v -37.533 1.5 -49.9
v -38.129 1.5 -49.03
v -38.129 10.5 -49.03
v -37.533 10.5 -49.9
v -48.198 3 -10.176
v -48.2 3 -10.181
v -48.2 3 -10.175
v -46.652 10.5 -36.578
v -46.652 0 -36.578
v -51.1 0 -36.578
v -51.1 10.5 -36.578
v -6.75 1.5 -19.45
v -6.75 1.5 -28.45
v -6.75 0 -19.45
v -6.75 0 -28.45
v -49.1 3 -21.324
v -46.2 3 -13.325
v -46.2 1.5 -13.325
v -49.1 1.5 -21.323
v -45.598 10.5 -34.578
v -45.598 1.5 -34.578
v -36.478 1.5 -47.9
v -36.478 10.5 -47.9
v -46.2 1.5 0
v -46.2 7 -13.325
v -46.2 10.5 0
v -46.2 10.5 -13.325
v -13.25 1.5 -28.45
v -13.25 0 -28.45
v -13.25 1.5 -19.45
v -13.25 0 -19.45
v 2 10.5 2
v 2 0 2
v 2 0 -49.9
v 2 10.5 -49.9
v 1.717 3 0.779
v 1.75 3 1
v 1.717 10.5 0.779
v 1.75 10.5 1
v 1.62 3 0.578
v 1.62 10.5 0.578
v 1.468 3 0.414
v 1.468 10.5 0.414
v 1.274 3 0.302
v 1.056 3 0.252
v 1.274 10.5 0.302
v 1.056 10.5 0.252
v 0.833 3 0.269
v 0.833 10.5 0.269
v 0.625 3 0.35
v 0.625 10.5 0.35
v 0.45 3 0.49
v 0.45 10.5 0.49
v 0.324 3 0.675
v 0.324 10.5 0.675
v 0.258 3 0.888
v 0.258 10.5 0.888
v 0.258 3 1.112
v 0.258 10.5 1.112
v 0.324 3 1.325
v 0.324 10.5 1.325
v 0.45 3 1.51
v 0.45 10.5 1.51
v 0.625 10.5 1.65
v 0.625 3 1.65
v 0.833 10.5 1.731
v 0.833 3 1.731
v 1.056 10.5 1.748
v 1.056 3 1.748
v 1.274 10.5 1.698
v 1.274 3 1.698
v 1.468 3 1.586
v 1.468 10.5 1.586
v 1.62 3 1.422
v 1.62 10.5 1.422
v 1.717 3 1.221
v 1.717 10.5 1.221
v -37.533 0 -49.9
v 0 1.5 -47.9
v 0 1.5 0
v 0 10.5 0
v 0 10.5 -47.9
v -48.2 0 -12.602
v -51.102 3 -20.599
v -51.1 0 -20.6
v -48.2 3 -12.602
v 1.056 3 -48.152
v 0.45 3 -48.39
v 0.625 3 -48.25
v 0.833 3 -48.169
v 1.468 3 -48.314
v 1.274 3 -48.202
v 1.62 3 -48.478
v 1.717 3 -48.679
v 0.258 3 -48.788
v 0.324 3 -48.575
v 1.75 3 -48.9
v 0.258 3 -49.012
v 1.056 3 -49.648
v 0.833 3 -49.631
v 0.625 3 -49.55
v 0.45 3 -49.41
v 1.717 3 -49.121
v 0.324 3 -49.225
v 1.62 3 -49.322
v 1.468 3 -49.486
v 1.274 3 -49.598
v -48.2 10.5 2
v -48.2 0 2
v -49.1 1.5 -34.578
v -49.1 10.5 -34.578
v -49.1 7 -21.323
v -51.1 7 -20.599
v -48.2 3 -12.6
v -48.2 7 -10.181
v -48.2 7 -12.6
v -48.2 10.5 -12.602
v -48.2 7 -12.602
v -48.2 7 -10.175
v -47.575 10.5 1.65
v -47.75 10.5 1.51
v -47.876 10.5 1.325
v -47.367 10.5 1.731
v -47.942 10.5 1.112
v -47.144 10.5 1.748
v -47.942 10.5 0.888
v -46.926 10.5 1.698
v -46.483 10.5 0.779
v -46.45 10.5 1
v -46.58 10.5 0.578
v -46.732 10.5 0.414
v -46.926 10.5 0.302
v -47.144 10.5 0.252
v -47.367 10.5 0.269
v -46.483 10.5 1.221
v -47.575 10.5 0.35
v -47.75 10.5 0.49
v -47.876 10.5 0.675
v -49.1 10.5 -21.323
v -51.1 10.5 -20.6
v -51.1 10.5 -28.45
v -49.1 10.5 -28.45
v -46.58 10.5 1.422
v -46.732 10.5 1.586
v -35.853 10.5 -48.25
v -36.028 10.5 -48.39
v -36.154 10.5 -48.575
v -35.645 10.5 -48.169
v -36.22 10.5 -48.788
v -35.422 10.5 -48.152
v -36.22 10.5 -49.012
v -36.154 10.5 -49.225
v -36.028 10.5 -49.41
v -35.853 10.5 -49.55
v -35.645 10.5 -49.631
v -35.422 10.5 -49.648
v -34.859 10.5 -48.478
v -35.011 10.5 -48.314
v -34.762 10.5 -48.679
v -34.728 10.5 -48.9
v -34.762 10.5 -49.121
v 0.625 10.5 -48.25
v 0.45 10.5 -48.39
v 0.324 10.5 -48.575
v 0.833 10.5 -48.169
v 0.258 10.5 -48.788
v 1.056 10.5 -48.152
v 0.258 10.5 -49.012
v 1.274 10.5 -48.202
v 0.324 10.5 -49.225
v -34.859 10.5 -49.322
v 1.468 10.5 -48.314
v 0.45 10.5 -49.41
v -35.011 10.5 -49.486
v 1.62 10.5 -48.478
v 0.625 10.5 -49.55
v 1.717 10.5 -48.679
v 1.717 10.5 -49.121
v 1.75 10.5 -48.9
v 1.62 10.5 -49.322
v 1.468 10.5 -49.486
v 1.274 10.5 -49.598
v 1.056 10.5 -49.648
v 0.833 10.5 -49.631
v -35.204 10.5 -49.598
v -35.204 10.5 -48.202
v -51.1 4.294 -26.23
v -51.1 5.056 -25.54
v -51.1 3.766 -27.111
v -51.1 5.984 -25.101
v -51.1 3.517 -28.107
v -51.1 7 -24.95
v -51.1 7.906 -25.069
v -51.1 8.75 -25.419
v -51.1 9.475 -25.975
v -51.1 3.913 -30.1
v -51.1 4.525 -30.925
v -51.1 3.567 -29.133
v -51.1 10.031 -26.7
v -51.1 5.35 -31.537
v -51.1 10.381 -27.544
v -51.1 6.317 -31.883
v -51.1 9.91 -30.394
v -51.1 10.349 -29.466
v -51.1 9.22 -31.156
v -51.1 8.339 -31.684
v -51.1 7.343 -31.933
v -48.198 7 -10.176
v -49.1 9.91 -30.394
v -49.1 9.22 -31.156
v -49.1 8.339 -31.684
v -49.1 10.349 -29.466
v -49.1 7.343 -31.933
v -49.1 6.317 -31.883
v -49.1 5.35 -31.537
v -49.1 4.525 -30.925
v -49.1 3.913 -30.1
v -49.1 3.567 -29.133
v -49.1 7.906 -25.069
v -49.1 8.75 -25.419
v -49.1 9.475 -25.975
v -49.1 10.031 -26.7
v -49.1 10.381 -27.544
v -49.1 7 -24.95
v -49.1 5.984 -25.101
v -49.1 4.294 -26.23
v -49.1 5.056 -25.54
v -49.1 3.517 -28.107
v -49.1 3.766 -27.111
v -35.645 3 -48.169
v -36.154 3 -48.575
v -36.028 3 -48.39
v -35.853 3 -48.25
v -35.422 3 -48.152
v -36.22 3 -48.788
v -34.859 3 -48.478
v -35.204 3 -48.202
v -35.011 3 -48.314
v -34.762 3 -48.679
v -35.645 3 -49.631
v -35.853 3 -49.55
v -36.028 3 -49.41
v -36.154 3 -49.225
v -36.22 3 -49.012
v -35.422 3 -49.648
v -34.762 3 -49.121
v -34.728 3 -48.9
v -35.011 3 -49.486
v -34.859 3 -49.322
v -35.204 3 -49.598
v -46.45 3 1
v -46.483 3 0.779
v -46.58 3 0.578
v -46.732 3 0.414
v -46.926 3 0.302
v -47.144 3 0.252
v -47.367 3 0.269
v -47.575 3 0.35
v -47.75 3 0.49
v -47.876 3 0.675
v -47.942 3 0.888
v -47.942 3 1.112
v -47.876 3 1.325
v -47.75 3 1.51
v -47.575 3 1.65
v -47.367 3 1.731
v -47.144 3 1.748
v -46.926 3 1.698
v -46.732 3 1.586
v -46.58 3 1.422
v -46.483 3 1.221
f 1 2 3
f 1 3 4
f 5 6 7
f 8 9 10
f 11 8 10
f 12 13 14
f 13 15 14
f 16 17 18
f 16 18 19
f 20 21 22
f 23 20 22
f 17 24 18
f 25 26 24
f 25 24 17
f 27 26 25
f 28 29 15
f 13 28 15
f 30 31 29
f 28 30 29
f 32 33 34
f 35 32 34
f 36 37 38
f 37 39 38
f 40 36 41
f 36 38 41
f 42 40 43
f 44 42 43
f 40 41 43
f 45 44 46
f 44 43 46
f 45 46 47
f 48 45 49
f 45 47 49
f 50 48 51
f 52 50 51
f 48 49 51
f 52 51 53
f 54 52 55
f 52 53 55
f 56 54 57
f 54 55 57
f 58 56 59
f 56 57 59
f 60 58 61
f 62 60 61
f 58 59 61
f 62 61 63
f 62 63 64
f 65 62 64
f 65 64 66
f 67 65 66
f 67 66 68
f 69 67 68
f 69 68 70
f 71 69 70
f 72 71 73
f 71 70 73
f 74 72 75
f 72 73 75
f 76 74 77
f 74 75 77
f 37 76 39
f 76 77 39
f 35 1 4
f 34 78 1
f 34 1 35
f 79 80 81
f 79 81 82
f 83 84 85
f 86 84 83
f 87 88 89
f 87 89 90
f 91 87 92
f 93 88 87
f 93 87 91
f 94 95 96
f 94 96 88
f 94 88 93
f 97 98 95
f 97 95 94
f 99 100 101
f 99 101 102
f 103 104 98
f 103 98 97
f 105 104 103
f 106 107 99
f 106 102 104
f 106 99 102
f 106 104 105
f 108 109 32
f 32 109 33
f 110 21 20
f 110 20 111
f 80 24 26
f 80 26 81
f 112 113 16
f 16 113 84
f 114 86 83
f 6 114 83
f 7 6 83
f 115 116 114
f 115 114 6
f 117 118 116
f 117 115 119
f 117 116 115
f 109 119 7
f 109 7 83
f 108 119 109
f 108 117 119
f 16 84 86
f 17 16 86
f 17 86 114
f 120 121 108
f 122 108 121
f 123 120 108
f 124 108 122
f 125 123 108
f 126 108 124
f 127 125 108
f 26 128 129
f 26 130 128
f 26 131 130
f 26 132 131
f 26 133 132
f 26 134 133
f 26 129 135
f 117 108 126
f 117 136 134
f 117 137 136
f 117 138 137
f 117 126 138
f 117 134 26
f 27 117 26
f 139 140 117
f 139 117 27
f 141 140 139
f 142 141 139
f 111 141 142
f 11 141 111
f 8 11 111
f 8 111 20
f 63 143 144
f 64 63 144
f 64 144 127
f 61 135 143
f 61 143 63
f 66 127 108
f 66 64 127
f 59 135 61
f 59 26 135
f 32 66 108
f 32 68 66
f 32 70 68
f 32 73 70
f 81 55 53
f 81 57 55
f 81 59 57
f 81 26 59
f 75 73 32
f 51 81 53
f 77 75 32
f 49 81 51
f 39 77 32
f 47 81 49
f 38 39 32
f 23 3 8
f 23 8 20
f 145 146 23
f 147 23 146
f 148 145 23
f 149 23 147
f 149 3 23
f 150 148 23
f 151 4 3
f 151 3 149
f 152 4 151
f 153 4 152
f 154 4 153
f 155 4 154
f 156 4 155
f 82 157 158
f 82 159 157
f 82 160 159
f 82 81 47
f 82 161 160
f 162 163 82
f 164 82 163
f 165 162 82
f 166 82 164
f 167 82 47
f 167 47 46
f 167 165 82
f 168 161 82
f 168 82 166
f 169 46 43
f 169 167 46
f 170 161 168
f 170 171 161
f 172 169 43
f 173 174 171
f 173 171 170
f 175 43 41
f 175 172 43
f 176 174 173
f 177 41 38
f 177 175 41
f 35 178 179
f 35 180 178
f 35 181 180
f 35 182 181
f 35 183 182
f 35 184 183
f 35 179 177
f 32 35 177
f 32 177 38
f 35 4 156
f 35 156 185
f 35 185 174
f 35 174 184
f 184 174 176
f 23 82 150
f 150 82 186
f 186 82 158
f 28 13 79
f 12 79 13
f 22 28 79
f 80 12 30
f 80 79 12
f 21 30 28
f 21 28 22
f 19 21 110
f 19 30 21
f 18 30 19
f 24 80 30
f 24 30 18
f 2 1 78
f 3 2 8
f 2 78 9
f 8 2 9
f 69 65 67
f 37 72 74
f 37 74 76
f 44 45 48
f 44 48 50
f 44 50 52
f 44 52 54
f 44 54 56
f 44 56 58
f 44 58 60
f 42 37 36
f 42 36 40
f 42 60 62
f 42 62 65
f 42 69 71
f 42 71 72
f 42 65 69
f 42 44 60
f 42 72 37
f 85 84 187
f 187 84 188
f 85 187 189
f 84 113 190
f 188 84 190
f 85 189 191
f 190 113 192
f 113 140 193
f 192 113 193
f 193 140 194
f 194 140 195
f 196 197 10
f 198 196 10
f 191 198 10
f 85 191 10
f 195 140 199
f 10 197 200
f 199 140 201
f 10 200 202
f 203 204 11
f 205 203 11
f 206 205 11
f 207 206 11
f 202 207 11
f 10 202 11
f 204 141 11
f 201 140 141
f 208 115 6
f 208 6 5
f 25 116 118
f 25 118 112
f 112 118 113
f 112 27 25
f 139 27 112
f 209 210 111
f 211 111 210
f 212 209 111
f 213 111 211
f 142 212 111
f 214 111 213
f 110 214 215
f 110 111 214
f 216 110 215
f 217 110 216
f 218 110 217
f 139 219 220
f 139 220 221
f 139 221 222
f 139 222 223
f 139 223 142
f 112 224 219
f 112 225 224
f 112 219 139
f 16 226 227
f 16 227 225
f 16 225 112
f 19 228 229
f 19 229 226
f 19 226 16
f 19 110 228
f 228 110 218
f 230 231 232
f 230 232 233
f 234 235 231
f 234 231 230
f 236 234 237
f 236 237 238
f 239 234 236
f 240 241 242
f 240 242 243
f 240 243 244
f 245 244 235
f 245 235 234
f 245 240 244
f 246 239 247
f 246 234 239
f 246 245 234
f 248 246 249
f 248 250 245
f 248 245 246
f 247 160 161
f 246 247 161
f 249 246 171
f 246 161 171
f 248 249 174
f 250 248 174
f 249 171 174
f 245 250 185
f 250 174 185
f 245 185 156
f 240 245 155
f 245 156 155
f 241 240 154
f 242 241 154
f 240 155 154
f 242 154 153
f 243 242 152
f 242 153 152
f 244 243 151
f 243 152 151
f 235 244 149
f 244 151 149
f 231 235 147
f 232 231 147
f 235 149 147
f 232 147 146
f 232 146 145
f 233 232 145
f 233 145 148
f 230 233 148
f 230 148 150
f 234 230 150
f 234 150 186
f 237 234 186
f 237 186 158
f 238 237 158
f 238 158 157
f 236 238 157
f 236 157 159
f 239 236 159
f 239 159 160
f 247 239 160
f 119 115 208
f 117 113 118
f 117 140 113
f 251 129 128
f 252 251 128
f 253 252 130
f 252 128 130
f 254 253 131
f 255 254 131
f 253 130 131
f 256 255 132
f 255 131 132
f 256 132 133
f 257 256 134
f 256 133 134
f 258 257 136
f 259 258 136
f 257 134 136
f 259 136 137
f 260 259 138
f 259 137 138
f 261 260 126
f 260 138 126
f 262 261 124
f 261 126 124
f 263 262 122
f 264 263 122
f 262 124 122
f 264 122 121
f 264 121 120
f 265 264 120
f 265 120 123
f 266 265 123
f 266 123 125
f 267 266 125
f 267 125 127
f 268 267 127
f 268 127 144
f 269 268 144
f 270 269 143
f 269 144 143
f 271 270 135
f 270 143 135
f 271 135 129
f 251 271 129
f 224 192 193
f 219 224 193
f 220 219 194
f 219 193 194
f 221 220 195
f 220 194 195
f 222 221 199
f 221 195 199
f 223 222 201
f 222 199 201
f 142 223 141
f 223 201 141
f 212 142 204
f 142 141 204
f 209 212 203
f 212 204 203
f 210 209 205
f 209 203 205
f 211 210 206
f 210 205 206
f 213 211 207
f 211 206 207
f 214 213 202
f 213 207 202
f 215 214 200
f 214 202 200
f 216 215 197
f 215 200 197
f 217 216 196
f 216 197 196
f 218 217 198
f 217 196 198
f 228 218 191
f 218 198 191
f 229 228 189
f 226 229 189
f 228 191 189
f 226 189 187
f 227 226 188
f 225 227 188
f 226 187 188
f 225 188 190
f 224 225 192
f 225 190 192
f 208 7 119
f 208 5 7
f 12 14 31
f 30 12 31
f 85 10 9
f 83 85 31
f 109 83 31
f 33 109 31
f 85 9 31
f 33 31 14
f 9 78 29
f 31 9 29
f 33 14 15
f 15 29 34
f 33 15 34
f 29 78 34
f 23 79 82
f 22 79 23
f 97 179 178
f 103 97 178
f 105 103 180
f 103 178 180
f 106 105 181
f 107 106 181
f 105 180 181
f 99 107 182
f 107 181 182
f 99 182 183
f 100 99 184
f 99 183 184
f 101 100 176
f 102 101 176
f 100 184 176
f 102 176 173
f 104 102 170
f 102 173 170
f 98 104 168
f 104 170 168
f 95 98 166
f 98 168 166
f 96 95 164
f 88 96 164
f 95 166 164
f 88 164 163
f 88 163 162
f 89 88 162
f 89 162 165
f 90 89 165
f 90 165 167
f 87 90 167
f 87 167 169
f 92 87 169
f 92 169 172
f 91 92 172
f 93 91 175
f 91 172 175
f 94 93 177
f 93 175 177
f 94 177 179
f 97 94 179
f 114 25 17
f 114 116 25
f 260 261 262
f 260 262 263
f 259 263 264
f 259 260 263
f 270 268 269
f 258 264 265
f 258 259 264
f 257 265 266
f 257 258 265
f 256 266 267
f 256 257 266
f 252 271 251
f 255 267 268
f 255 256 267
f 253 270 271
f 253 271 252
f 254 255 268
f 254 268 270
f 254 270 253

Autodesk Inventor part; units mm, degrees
ref_plane "YZ Plane" through (0, 0, 0) normal (1, 0, 0) x (0, 1, 0)
ref_plane "XZ Plane" through (0, 0, 0) normal (0, 1, 0) x (-1, 0, 0)
ref_plane "XY Plane" through (0, 0, 0) normal (0, 0, 1) x (1, 0, 0)
sketch "Sketch1" plane through (0, 0, 0) normal (0, 1, 0) x (-1, 0, 0)
  line L0 (0, 0) -> (49.1, 0)
  line L1 (49.1, -47.9) -> (0, -47.9)
  line L2 (0, -47.9) -> (0, 0)
  line L3 (46.7, -10.9) -> (49.1, -18.9)
  line L4 (46.7, -10.9) -> (46.7, 0)
  line L5 (49.1, 0) -> (46.7, 0)
  line L6 (49.1, -18.9) -> (49.1, -47.9)
  dimension "d0" = 49.1
  dimension "d1" = 47.9
  dimension "d2" = 18.9
extrude "Extrusion1" add sketch "Sketch1" along normal blind 1.5
sketch "Sketch2" plane through (0, 1.5, 0) normal (0, 1, 0) x (1, 0, 0)
  line L0 (-49.1, 18.9) -> (-46.7, 10.9) projected
  line L1 (-46.2, 10.9) -> (-46.2, 0)
  line L2 (-46.2, 0) -> (-46.7, 0)
  line L3 (-46.7, 10.9) -> (-46.7, 0) projected
  line L4 (-46.7, 0) -> (-46.7, 10.9)
  line L5 (-49.1, 47.9) -> (-49.1, 18.9) projected
  line L6 (-46.7, 10.9) -> (-49.1, 18.9)
  line L7 (-49.1, 18.9) -> (-46.2, 10.9)
  point P0 (0, 0)
extrude "Extrusion2" cut sketch "Sketch2" against normal blind 10
sketch "Sketch3" plane through (0, 1.5, 0) normal (0, 1, 0) x (1, 0, 0)
  line L0 (-49.1, 47.9) -> (-49.1, 18.9) projected
  line L1 (-49.1, 34.5784) -> (-45.5979, 34.5784)
  line L2 (-45.5979, 34.5784) -> (-36.4784, 47.9)
  line L3 (0, 47.9) -> (-49.1, 47.9) projected
  line L4 (-49.1, 47.9) -> (-36.4784, 47.9)
  line L5 (-49.1, 47.9) -> (-49.1, 34.5784)
  point P0 (0, 0)
extrude "Extrusion3" cut sketch "Sketch3" against normal blind 10
sketch "Sketch4" plane through (0, 1.5, 0) normal (0, 1, 0) x (1, 0, 0)
  line L0 (-46.2, 10.9) -> (-49.1, 18.9) projected
  line L1 (-46.2, 0) -> (0, 0) projected
  line L2 (-46.2, -2) -> (0, -2)
  line L3 (0, -2) -> (2, -2)
  line L4 (2, -2) -> (2, 47.9)
  line L5 (0, 47.9) -> (-36.4784, 47.9) projected
  line L6 (2, 47.9) -> (2, 49.9)
  line L7 (2, 49.9) -> (-36.4784, 49.9)
  line L8 (-38.1287, 49.0298) -> (-37.533, 49.9)
  line L9 (-37.533, 49.9) -> (-36.4784, 49.9)
  line L10 (-45.5979, 34.5784) -> (-36.4784, 47.9) projected
  line L11 (-49.1, 36.5784) -> (-46.6525, 36.5784)
  line L12 (-46.6525, 36.5784) -> (-37.533, 49.9)
  line L13 (-46.2, -2) -> (-48.2, -2)
  line L14 (-48.2, -2) -> (-48.2, 10.9)
  line L15 (-51.1, 18.9) -> (-48.2, 10.9)
  line L16 (-49.1, 36.5784) -> (-51.1, 36.5784)
  line L17 (-51.1, 36.5784) -> (-51.1, 18.9)
  line L18 (0, 0) -> (0, 47.9) projected
  line L19 (0, 0) -> (0, 47.9)
  line L20 (0, 47.9) -> (-36.4784, 47.9)
  line L21 (-36.4784, 47.9) -> (-45.5979, 34.5784)
  line L22 (-45.5979, 34.5784) -> (-49.1, 34.5784) projected
  line L23 (-49.1, 34.5784) -> (-45.5979, 34.5784)
  line L24 (-49.1, 34.5784) -> (-49.1, 18.9) projected
  line L25 (-49.1, 34.5784) -> (-49.1, 18.9)
  line L26 (-49.1, 18.9) -> (-46.2, 10.9)
  line L27 (-46.2, 0) -> (-46.2, 10.9)
  line L28 (-46.2, 0) -> (0, 0)
  dimension "d16" = 2
  dimension "d17" = 2
  dimension "d18" = 2
  dimension "d23" = 2
extrude "Extrusion4" add sketch "Sketch4" along normal blind 9
sketch "Sketch5" plane through (0, 0, 0) normal (0, -1, 0) x (1, 0, 0)
  line L0 (-46.2, 0) -> (0, 0) projected
  line L1 (0, 0) -> (-46.2, 0)
  line L2 (-46.2, 0) -> (-46.2, -10.9) projected
  line L3 (-46.2, 0) -> (-46.2, -10.9)
  line L4 (-46.2, -10.9) -> (-49.1, -18.9) projected
  line L5 (-46.2, -10.9) -> (-49.1, -18.9)
  line L6 (-49.1, -18.9) -> (-49.1, -34.5784) projected
  line L7 (-49.1, -18.9) -> (-49.1, -34.5784)
  line L8 (-49.1, -34.5784) -> (-45.5979, -34.5784) projected
  line L9 (-49.1, -34.5784) -> (-45.5979, -34.5784)
  line L10 (-36.4784, -47.9) -> (-45.5979, -34.5784) projected
  line L11 (-45.5979, -34.5784) -> (-36.4784, -47.9)
  line L12 (-36.4784, -47.9) -> (0, -47.9) projected
  line L13 (-36.4784, -47.9) -> (0, -47.9)
  line L14 (0, -47.9) -> (0, 0)
  line L15 (-48.2, 2) -> (2, 2) projected
  line L16 (2, 2) -> (-48.2, 2)
  line L17 (-51.1, -18.9) -> (-48.2, -10.9) projected
  line L18 (-48.2, 2) -> (-48.2, -10.9)
  line L19 (-48.2, -10.9) -> (-51.1, -18.9)
  line L20 (-51.1, -18.9) -> (-51.1, -36.5784)
  line L21 (-46.6525, -36.5784) -> (-51.1, -36.5784) projected
  line L22 (-51.1, -36.5784) -> (-46.6525, -36.5784)
  line L23 (-37.533, -49.9) -> (-46.6525, -36.5784) projected
  line L24 (-46.6525, -36.5784) -> (-37.533, -49.9)
  line L25 (2, 2) -> (2, -49.9) projected
  line L26 (-37.533, -49.9) -> (2, -49.9)
  line L27 (2, -49.9) -> (2, 2)
extrude "Extrusion5" add sketch "Sketch5" against normal blind 1.5
sketch "Sketch6" plane through (0, 10.5, 0) normal (0, 1, 0) x (1, 0, 0)
  line L0 (-48.2, -2) -> (2, -2) projected
  circle A0 centre (1, -1) radius 0.75
  line L1 (-46.2, 0) -> (-46.2, 10.9) projected
  circle A1 centre (-47.2, -1) radius 0.75
  point P0 (0, 0)
  dimension "d35" = 1.5
sketch "Sketch7" plane through (0, 10.5, 0) normal (0, 1, 0) x (1, 0, 0)
  point P0 (0, 0)
extrude "Extrusion6" cut sketch "Sketch6" against normal blind 7.5
sketch "Sketch8" plane through (0, 10.5, 0) normal (0, 1, 0) x (1, 0, 0)
  line L0 (-45.5979, 34.5784) -> (-36.4784, 47.9) projected
  circle A0 centre (-35.4784, 48.9) radius 0.75
  circle A1 centre (1, 48.9) radius 0.75
  point P0 (0, 0)
  dimension "d40" = 1.5
  dimension "d43" = 1.5
extrude "Extrusion7" cut sketch "Sketch8" against normal blind 7.5
sketch "Sketch9" plane through (0, 0, 0) normal (0, -1, 0) x (1, 0, 0)
  line L0 (-48.2, 2) -> (2, 2) projected
  line L1 (2, 2) -> (2, -49.9) projected
  line L2 (-6.75, -23.95) -> (-6.75, -19.45)
  line L3 (-6.75, -19.45) -> (-13.25, -19.45)
  line L4 (-13.25, -19.45) -> (-13.25, -28.45)
  line L5 (-13.25, -28.45) -> (-6.75, -28.45)
  line L6 (-6.75, -28.45) -> (-6.75, -23.95)
  point P0 (0, 0)
  dimension "d51" = 6.5
  dimension "d52" = 9
extrude "Extrusion8" cut sketch "Sketch9" against normal blind 1.5
sketch "Sketch10" plane through (0, 10.5, 0) normal (0, 1, 0) x (1, 0, 0)
  line L0 (-49.1, 18.9) -> (-46.2, 10.9) projected
  line L1 (-48.2, -2) -> (-48.2, 10.9) projected
  line L2 (-48.2, 10.9) -> (-51.1, 18.9) projected
  line L3 (-48.2, 10.175) -> (-48.2, 10.9)
  line L4 (-51.1, 18.9) -> (-51.1, 36.5784) projected
  line L5 (-51.1, 18.175) -> (-51.1, 18.9)
  line L6 (-51.1, 18.175) -> (-48.2, 10.175)
  line L7 (-48.2, 10.9) -> (-51.1, 18.9)
  point P0 (0, 0)
extrude "Extrusion9" add sketch "Sketch10" against normal blind 10.5
sketch "Sketch11" plane through (-51.1, 0, -18.175) normal (-0.9401361, 0, 0.3407993) x (0.3407993, 0, 0.9401361)
  point P0 (34.5018, 0)
sketch "Sketch12" plane through (-51.1, 0, -18.175) normal (-0.9401361, 0, 0.3407993) x (0.3407993, 0, 0.9401361)
  line L0 (0, 10.5) -> (0, 0) projected
  line L1 (5.4546, 0) -> (3.2394, 0) projected
  line L2 (4.2545, 0) -> (7.2545, 0) construction
  line L3 (4.2545, 7) -> (0, 7)
  line L4 (0, 7) -> (0, 3)
  line L5 (0, 3) -> (8.5094, 3)
  line L6 (8.5094, 1.5) -> (8.5094, 10.5) projected
  line L7 (4.2545, 7) -> (8.5094, 7)
  line L8 (8.5094, 10.5) -> (8.5094, 0) projected
  line L9 (8.5094, 3) -> (8.5094, 7)
  line L10 (0, 10.5) -> (8.5094, 10.5) projected
  line L11 (0, 10.5) -> (0, 0) projected
  line L12 (8.5094, 0) -> (0, 0) projected
  line L13 (8.5094, 10.5) -> (8.5094, 0) projected
  point P0 (34.5018, 0)
  dimension "d58" = 4.2545
extrude "Extrusion10" cut sketch "Sketch12" along normal blind 5 contours L3 L7 L6 L5 L0
sketch "Sketch14" plane through (0, 10.5, 0) normal (0, 1, 0) x (1, 0, 0)
  point P0 (0, 0)
sketch "Sketch15" plane through (0, 10.5, 0) normal (0, 1, 0) x (1, 0, 0)
  line L0 (-46.2, 0) -> (-46.2, 10.9) projected
  line L1 (-46.2, 10.9) -> (-46.2, 11.9)
  line L2 (-46.2, 11.9) -> (-49.1, 19.8981)
  line L3 (-49.1, 34.5784) -> (-49.1, 18.9) projected
  line L4 (-46.2, 11.9) -> (-37.6924, 11.9) construction
  line L5 (-49.1, 19.8981) -> (-49.1, 18.9)
  line L6 (-49.1, 18.9) -> (-46.2, 10.9) projected
  line L7 (-49.1, 18.9) -> (-46.2, 10.9)
  point P0 (0, 0)
  dimension "d71" = 1
  dimension "d72" = 109.93
extrude "Extrusion12" add sketch "Sketch15" against normal blind 9
sketch "Sketch16" plane through (0, 10.5, 0) normal (0, 1, 0) x (1, 0, 0)
  line L0 (-51.1, 18.175) -> (-48.2, 10.175) projected
  line L1 (-51.1, 18.175) -> (-51.1, 19.175)
  line L2 (-51.1, 36.5784) -> (-51.1, 18.175) projected
  line L3 (-51.1, 19.175) -> (-48.2, 11.1769)
  line L4 (-51.1, 19.175) -> (-42.5924, 19.175) construction
  line L5 (-48.2, 11.1769) -> (-48.2, 10.175)
  line L6 (-48.2, 10.175) -> (-48.2, -2) projected
  line L7 (-51.1, 18.175) -> (-48.2, 10.175)
  point P0 (0, 0)
  dimension "d75" = 1
  dimension "d76" = 70.07
extrude "Extrusion13" cut sketch "Sketch16" against normal blind 10.5
sketch "Sketch17" plane through (-51.1, 0, -36.5784) normal (-1, 0, 0) x (0, 0, 1)
  line L0 (-13.3216, 0) -> (-13.3216, 10.5) projected
  line L1 (36.8284, 10.5) -> (36.8284, 3) projected
  line L2 (38.5784, 0) -> (38.5784, 10.5) projected
  line L3 (15.9784, 5.25) -> (15.9784, 10.5) construction
  line L4 (16.6804, 10.5) -> (2, 10.5) projected
  point P0 (36.5784, 0)
sketch "Sketch18" plane through (0, 10.5, 0) normal (0, 1, 0) x (1, 0, 0)
  line L0 (-51.1, 19.175) -> (-51.1, 36.5784) projected
  line L1 (-51.1, 19.175) -> (-51.1, 20.6)
  line L2 (-51.1, 20.6) -> (-48.2, 12.6019)
  line L3 (-51.1, 20.6) -> (-42.5924, 20.6) construction
  line L4 (-51.1, 19.175) -> (-48.2, 11.1769) projected
  line L5 (-48.2, 12.6019) -> (-48.2, 11.1769)
  line L6 (-51.1, 19.175) -> (-48.2, 11.1769)
  point P0 (0, 0)
  dimension "d82" = 1.425
  dimension "d83" = 70.07
extrude "Extrusion14" cut sketch "Sketch18" against normal blind 10.5
sketch "Sketch19" plane through (0, 10.5, 0) normal (0, 1, 0) x (1, 0, 0)
  line L0 (-46.2, 11.9) -> (-49.1, 19.8981) projected
  line L1 (-46.2, 11.9) -> (-46.2, 13.325)
  line L2 (-46.2, 13.325) -> (-49.1, 21.3231)
  line L3 (-49.1, 19.8981) -> (-49.1, 34.5784) projected
  line L4 (-49.1, 21.3231) -> (-49.1, 19.8981)
  line L5 (-49.1, 19.8981) -> (-46.2, 11.9)
  point P0 (0, 0)
  dimension "d86" = 1.425
  dimension "d87" = 160.07
extrude "Extrusion15" add sketch "Sketch19" against normal blind 9
sketch "Sketch20" plane through (-51.1, 0, -20.6) normal (-0.9401098, 0, 0.3408718) x (0.3408718, 0, 0.9401098)
  line L0 (0, 3) -> (8.5096, 3)
  line L1 (8.5096, 10.5) -> (8.5096, 1.5) projected
  line L2 (8.5096, 3) -> (8.5096, 7)
  line L3 (8.5096, 7) -> (0.002, 7)
  line L4 (0.002, 10.5) -> (0.002, 1.5) projected
  line L5 (0, 3) -> (0.002, 7)
  point P0 (36.7848, 0)
  point P1 (0, 0)
  point P2 (8.5096, 7)
  dimension "d90" = 3
  dimension "d91" = 4
extrude "Extrusion16" cut sketch "Sketch20" against normal blind 10
sketch "Sketch21" plane through (-51.1, 0, -36.5784) normal (-1, 0, 0) x (0, 0, 1)
  point P0 (36.5784, 0)
sketch "Sketch22" plane through (-51.1, 0, -36.5784) normal (-1, 0, 0) x (0, 0, 1)
  line L0 (15.9784, 0) -> (0, 0) projected
  line L1 (17.1284, 0) -> (8.1284, 0) projected
  circle A0 centre (8.1284, 7) radius 3.5
  point P0 (36.5784, 0)
  dimension "d98" = 7
extrude "Extrusion17" cut sketch "Sketch22" against normal blind 10
properties part number "Case"
